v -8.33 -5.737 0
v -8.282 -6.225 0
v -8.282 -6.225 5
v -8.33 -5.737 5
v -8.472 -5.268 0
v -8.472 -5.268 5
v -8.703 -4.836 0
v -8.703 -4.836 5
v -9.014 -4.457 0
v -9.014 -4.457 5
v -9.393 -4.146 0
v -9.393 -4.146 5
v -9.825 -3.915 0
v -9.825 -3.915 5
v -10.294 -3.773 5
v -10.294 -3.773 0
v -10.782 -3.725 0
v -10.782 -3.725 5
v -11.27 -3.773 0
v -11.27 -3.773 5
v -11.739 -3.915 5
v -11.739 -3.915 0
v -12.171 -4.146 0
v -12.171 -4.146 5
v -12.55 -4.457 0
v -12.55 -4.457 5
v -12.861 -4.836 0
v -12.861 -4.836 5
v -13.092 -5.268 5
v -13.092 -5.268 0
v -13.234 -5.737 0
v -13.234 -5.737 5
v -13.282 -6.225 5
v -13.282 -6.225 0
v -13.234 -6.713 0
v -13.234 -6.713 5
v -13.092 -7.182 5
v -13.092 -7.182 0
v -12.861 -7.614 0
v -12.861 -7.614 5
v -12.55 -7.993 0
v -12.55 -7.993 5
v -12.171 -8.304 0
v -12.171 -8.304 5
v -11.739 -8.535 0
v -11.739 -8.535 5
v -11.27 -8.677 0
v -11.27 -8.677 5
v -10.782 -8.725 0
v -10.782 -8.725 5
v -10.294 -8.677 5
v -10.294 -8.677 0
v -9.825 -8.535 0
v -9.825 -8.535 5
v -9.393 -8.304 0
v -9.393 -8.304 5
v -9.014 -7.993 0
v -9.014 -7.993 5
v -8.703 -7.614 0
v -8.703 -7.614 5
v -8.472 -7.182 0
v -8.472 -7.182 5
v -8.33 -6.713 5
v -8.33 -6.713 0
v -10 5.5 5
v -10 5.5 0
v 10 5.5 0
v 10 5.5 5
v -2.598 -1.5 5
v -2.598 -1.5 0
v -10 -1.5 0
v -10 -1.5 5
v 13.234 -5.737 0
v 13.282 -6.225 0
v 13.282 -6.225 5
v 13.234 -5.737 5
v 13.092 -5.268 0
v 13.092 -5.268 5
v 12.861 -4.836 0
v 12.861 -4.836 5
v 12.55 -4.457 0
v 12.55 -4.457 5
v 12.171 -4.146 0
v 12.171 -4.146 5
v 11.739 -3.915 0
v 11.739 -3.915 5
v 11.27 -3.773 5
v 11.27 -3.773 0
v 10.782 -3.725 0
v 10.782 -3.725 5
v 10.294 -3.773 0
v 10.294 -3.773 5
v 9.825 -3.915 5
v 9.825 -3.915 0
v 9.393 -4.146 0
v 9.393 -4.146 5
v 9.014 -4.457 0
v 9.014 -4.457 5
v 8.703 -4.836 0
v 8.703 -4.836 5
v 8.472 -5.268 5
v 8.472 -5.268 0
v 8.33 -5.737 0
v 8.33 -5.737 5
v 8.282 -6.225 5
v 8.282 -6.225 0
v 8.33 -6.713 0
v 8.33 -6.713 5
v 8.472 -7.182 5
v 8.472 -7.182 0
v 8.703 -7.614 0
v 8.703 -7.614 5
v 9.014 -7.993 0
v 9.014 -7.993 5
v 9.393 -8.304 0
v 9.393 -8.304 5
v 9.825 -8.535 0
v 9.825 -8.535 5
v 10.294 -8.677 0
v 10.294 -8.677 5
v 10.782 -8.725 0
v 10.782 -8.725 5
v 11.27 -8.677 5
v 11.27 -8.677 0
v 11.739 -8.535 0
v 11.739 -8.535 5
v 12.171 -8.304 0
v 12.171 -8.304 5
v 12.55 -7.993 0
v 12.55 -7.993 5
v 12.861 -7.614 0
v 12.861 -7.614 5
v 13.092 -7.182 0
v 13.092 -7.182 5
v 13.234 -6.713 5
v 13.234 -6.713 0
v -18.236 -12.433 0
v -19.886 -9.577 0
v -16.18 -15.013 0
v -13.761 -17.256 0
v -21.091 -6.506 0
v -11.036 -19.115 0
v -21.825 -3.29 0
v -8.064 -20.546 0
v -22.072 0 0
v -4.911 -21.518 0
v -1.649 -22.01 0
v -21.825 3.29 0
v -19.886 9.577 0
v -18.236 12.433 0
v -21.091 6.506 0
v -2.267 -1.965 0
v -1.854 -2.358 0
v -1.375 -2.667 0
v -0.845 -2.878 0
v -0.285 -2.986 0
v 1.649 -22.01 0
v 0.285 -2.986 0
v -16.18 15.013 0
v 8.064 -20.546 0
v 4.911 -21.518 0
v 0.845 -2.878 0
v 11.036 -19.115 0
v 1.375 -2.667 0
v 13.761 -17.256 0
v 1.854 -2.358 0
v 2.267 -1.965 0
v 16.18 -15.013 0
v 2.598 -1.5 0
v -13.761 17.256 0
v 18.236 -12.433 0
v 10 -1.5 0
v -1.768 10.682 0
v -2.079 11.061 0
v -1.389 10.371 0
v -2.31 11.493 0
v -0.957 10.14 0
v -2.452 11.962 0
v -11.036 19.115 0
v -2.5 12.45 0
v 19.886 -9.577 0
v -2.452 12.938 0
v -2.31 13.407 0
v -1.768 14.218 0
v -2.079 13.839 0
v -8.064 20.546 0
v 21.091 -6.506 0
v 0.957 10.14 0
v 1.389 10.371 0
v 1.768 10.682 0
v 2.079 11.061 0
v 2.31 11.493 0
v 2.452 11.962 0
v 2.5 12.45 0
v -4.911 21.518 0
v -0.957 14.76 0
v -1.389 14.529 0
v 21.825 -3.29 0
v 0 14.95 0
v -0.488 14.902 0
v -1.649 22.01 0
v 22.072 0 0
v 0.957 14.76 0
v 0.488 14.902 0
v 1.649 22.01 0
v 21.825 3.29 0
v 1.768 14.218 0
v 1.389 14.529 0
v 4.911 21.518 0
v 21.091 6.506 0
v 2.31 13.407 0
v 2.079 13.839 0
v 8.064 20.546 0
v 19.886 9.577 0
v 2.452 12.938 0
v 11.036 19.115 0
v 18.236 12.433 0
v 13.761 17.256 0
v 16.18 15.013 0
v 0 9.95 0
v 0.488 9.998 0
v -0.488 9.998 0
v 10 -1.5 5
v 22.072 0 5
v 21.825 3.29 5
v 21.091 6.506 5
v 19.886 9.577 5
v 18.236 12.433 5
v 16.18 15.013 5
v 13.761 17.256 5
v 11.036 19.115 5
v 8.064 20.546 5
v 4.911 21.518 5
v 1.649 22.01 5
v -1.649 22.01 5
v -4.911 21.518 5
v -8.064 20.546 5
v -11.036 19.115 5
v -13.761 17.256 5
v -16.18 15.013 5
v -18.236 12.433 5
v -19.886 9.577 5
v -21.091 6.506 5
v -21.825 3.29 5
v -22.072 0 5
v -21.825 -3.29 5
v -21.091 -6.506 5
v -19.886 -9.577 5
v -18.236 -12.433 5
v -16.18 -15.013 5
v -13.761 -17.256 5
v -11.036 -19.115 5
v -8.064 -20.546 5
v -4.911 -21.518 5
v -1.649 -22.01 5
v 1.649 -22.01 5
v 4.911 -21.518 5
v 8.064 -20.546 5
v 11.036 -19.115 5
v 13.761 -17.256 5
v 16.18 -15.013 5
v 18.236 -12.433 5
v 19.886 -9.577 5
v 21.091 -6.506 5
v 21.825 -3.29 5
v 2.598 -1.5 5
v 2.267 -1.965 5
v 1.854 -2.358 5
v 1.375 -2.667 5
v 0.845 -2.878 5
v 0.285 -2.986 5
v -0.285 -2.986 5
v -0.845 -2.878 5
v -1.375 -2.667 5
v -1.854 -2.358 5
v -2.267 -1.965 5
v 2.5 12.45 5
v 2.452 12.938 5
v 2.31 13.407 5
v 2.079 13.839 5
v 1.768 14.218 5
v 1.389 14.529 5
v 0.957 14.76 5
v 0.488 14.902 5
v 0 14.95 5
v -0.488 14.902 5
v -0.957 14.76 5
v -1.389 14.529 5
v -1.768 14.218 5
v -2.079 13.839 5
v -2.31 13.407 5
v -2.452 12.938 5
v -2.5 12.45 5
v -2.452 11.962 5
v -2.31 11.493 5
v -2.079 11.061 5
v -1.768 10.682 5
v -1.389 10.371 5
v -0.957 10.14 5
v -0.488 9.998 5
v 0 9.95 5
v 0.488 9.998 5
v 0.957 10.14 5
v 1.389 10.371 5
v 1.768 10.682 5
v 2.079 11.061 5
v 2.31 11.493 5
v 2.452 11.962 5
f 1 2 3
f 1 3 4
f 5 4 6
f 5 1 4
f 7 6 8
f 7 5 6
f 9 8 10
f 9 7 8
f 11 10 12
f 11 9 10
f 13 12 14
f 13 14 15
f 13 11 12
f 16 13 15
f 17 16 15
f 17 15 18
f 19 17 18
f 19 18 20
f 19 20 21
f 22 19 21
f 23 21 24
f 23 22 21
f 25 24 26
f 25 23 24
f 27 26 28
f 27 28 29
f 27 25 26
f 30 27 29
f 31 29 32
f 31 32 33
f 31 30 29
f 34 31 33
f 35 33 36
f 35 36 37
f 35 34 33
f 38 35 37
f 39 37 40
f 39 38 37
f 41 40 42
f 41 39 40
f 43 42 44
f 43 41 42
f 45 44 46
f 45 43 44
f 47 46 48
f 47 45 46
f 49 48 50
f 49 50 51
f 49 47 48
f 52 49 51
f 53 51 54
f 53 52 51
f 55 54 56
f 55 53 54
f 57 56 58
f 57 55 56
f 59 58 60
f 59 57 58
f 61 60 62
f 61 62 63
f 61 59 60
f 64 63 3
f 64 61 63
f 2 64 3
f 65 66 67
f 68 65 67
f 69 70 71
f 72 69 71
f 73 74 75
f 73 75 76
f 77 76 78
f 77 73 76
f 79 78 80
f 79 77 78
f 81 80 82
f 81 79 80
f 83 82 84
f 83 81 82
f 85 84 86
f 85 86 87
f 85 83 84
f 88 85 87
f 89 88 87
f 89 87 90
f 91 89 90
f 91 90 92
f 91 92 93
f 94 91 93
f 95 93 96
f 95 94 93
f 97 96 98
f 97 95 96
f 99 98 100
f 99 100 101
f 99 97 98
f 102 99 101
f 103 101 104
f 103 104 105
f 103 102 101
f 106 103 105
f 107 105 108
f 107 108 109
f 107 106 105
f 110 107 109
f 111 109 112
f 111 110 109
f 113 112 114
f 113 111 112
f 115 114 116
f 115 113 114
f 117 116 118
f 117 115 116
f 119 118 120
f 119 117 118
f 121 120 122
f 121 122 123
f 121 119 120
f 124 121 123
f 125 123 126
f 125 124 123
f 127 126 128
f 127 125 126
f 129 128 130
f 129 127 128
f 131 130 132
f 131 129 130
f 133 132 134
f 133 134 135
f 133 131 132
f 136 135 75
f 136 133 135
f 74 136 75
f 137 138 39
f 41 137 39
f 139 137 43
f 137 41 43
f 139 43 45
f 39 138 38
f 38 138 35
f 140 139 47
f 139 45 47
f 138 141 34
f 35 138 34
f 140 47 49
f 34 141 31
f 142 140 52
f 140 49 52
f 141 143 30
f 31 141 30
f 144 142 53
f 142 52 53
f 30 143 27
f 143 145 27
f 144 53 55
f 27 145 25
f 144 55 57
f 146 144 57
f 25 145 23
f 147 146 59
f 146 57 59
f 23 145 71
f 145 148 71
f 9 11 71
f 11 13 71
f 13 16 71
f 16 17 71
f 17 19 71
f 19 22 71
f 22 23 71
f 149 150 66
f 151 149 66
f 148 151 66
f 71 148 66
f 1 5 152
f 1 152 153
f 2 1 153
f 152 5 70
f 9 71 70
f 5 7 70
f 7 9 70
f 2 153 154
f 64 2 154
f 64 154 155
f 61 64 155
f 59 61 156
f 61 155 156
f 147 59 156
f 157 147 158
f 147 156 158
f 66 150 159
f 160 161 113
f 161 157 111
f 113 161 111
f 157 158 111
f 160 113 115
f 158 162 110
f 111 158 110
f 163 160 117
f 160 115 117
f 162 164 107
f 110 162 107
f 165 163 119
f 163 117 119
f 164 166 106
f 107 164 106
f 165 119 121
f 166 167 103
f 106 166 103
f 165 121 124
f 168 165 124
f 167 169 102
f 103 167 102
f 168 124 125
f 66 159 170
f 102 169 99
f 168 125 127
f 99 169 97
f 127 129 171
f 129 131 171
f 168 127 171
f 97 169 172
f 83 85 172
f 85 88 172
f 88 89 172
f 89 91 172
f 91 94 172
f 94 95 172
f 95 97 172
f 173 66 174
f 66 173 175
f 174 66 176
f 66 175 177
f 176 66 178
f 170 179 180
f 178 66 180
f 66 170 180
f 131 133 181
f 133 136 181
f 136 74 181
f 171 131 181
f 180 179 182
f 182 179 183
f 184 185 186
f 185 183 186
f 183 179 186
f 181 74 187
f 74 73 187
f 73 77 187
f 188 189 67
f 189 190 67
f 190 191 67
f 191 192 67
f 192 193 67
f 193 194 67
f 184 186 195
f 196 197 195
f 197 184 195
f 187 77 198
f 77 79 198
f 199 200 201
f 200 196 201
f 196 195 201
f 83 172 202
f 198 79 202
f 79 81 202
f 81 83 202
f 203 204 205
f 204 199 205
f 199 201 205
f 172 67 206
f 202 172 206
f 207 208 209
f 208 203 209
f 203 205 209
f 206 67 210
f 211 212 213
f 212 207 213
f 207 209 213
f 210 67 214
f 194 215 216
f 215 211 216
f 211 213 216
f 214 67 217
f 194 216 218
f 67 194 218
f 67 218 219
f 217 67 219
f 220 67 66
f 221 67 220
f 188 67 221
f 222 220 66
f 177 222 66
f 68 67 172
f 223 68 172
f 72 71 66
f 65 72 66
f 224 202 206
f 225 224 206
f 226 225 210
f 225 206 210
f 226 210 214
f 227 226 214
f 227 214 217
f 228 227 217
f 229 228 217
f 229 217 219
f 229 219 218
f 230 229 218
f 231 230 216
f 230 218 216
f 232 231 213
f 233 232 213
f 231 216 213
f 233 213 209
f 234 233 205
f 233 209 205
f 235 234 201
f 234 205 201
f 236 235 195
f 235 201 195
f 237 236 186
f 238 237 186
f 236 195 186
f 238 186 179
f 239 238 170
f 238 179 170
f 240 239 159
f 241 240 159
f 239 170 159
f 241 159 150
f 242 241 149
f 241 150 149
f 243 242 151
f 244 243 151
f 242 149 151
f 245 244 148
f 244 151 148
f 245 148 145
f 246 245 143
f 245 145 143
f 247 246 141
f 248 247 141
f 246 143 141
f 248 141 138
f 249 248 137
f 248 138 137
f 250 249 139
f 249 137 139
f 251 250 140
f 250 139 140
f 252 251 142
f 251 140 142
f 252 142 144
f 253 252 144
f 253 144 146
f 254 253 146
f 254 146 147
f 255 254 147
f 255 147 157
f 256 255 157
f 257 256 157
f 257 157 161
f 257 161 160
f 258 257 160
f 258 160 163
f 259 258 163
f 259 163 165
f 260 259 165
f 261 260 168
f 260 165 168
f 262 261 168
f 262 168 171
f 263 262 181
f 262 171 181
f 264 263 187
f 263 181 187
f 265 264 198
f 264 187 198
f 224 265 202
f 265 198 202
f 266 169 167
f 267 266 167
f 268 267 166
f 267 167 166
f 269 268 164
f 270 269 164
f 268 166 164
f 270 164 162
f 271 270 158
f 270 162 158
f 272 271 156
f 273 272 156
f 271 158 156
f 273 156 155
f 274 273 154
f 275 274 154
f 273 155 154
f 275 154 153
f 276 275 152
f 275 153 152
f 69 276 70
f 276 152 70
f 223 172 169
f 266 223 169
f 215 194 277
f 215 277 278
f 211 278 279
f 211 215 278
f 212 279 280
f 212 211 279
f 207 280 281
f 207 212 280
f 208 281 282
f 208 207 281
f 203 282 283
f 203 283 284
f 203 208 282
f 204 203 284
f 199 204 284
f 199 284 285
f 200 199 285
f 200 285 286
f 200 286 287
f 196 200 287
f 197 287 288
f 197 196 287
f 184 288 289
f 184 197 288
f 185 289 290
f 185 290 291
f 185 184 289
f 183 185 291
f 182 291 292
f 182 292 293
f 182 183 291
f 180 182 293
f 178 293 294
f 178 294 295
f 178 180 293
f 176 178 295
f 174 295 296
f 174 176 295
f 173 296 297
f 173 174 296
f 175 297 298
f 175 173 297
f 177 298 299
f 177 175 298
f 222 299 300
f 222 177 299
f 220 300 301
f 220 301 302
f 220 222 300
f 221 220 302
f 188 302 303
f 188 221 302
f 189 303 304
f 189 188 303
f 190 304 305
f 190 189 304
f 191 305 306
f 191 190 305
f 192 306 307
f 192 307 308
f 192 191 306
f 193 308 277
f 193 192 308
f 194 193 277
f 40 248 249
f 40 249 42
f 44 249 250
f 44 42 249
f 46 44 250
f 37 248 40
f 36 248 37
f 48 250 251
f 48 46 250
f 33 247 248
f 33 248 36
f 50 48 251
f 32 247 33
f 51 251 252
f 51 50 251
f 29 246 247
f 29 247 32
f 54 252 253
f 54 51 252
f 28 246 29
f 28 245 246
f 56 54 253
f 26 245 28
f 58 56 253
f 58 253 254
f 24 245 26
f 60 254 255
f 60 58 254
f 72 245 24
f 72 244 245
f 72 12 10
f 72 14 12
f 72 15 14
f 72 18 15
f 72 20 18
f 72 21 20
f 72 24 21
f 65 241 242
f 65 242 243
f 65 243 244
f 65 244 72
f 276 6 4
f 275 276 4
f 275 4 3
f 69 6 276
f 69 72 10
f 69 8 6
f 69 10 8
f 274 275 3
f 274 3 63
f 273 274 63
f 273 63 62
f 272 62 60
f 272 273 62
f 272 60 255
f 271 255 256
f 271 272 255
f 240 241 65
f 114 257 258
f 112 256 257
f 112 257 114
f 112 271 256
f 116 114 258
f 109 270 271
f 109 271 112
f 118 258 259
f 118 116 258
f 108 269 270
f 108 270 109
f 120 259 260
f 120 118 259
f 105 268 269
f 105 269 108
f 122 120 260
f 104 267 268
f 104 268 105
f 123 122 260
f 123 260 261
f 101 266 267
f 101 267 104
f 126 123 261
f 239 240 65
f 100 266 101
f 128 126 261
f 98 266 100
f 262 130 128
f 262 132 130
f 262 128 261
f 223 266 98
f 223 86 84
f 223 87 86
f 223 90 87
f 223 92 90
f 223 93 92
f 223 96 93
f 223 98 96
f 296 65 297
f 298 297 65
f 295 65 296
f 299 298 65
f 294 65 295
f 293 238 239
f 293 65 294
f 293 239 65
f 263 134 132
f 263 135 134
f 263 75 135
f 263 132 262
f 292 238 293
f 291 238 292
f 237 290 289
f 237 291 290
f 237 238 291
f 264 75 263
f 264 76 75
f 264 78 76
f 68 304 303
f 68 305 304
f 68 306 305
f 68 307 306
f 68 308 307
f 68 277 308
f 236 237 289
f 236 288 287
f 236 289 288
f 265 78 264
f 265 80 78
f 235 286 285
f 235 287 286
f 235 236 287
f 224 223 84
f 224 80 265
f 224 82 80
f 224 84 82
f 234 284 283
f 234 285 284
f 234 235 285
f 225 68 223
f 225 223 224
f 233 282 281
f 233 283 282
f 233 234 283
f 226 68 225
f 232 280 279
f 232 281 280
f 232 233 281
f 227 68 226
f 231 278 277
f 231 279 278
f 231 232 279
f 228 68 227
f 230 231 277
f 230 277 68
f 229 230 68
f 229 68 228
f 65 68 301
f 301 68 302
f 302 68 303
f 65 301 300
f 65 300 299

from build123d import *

# Parameters (mm, degrees)
SKETCH_1_R      = 22.071639064
SKETCH_1_R_2    = 2.5
EXTRUDE_1_DEPTH = 5


with BuildPart() as part:
    # 스케치1 → 보스-돌출1 (new body)
    with BuildSketch(Plane.XY):
        Circle(SKETCH_1_R)
        with Locations((0, 12.45)):
            Circle(SKETCH_1_R_2, mode=Mode.SUBTRACT)
        with Locations((-10.782016277, -6.225)):
            Circle(SKETCH_1_R_2, mode=Mode.SUBTRACT)
        with Locations((10.782016277, -6.225)):
            Circle(SKETCH_1_R_2, mode=Mode.SUBTRACT)
        with BuildLine():
            Line((10, 5.5), (10, -1.5))
            Line((10, -1.5), (2.598076211, -1.5))
            ThreePointArc((2.598076211, -1.5), (0, -3), (-2.598076211, -1.5))
            Line((-2.598076211, -1.5), (-10, -1.5))
            Line((-10, -1.5), (-10, 5.5))
            Line((-10, 5.5), (10, 5.5))
        make_face(mode=Mode.SUBTRACT)
    extrude(amount=EXTRUDE_1_DEPTH)


solid = part.part
